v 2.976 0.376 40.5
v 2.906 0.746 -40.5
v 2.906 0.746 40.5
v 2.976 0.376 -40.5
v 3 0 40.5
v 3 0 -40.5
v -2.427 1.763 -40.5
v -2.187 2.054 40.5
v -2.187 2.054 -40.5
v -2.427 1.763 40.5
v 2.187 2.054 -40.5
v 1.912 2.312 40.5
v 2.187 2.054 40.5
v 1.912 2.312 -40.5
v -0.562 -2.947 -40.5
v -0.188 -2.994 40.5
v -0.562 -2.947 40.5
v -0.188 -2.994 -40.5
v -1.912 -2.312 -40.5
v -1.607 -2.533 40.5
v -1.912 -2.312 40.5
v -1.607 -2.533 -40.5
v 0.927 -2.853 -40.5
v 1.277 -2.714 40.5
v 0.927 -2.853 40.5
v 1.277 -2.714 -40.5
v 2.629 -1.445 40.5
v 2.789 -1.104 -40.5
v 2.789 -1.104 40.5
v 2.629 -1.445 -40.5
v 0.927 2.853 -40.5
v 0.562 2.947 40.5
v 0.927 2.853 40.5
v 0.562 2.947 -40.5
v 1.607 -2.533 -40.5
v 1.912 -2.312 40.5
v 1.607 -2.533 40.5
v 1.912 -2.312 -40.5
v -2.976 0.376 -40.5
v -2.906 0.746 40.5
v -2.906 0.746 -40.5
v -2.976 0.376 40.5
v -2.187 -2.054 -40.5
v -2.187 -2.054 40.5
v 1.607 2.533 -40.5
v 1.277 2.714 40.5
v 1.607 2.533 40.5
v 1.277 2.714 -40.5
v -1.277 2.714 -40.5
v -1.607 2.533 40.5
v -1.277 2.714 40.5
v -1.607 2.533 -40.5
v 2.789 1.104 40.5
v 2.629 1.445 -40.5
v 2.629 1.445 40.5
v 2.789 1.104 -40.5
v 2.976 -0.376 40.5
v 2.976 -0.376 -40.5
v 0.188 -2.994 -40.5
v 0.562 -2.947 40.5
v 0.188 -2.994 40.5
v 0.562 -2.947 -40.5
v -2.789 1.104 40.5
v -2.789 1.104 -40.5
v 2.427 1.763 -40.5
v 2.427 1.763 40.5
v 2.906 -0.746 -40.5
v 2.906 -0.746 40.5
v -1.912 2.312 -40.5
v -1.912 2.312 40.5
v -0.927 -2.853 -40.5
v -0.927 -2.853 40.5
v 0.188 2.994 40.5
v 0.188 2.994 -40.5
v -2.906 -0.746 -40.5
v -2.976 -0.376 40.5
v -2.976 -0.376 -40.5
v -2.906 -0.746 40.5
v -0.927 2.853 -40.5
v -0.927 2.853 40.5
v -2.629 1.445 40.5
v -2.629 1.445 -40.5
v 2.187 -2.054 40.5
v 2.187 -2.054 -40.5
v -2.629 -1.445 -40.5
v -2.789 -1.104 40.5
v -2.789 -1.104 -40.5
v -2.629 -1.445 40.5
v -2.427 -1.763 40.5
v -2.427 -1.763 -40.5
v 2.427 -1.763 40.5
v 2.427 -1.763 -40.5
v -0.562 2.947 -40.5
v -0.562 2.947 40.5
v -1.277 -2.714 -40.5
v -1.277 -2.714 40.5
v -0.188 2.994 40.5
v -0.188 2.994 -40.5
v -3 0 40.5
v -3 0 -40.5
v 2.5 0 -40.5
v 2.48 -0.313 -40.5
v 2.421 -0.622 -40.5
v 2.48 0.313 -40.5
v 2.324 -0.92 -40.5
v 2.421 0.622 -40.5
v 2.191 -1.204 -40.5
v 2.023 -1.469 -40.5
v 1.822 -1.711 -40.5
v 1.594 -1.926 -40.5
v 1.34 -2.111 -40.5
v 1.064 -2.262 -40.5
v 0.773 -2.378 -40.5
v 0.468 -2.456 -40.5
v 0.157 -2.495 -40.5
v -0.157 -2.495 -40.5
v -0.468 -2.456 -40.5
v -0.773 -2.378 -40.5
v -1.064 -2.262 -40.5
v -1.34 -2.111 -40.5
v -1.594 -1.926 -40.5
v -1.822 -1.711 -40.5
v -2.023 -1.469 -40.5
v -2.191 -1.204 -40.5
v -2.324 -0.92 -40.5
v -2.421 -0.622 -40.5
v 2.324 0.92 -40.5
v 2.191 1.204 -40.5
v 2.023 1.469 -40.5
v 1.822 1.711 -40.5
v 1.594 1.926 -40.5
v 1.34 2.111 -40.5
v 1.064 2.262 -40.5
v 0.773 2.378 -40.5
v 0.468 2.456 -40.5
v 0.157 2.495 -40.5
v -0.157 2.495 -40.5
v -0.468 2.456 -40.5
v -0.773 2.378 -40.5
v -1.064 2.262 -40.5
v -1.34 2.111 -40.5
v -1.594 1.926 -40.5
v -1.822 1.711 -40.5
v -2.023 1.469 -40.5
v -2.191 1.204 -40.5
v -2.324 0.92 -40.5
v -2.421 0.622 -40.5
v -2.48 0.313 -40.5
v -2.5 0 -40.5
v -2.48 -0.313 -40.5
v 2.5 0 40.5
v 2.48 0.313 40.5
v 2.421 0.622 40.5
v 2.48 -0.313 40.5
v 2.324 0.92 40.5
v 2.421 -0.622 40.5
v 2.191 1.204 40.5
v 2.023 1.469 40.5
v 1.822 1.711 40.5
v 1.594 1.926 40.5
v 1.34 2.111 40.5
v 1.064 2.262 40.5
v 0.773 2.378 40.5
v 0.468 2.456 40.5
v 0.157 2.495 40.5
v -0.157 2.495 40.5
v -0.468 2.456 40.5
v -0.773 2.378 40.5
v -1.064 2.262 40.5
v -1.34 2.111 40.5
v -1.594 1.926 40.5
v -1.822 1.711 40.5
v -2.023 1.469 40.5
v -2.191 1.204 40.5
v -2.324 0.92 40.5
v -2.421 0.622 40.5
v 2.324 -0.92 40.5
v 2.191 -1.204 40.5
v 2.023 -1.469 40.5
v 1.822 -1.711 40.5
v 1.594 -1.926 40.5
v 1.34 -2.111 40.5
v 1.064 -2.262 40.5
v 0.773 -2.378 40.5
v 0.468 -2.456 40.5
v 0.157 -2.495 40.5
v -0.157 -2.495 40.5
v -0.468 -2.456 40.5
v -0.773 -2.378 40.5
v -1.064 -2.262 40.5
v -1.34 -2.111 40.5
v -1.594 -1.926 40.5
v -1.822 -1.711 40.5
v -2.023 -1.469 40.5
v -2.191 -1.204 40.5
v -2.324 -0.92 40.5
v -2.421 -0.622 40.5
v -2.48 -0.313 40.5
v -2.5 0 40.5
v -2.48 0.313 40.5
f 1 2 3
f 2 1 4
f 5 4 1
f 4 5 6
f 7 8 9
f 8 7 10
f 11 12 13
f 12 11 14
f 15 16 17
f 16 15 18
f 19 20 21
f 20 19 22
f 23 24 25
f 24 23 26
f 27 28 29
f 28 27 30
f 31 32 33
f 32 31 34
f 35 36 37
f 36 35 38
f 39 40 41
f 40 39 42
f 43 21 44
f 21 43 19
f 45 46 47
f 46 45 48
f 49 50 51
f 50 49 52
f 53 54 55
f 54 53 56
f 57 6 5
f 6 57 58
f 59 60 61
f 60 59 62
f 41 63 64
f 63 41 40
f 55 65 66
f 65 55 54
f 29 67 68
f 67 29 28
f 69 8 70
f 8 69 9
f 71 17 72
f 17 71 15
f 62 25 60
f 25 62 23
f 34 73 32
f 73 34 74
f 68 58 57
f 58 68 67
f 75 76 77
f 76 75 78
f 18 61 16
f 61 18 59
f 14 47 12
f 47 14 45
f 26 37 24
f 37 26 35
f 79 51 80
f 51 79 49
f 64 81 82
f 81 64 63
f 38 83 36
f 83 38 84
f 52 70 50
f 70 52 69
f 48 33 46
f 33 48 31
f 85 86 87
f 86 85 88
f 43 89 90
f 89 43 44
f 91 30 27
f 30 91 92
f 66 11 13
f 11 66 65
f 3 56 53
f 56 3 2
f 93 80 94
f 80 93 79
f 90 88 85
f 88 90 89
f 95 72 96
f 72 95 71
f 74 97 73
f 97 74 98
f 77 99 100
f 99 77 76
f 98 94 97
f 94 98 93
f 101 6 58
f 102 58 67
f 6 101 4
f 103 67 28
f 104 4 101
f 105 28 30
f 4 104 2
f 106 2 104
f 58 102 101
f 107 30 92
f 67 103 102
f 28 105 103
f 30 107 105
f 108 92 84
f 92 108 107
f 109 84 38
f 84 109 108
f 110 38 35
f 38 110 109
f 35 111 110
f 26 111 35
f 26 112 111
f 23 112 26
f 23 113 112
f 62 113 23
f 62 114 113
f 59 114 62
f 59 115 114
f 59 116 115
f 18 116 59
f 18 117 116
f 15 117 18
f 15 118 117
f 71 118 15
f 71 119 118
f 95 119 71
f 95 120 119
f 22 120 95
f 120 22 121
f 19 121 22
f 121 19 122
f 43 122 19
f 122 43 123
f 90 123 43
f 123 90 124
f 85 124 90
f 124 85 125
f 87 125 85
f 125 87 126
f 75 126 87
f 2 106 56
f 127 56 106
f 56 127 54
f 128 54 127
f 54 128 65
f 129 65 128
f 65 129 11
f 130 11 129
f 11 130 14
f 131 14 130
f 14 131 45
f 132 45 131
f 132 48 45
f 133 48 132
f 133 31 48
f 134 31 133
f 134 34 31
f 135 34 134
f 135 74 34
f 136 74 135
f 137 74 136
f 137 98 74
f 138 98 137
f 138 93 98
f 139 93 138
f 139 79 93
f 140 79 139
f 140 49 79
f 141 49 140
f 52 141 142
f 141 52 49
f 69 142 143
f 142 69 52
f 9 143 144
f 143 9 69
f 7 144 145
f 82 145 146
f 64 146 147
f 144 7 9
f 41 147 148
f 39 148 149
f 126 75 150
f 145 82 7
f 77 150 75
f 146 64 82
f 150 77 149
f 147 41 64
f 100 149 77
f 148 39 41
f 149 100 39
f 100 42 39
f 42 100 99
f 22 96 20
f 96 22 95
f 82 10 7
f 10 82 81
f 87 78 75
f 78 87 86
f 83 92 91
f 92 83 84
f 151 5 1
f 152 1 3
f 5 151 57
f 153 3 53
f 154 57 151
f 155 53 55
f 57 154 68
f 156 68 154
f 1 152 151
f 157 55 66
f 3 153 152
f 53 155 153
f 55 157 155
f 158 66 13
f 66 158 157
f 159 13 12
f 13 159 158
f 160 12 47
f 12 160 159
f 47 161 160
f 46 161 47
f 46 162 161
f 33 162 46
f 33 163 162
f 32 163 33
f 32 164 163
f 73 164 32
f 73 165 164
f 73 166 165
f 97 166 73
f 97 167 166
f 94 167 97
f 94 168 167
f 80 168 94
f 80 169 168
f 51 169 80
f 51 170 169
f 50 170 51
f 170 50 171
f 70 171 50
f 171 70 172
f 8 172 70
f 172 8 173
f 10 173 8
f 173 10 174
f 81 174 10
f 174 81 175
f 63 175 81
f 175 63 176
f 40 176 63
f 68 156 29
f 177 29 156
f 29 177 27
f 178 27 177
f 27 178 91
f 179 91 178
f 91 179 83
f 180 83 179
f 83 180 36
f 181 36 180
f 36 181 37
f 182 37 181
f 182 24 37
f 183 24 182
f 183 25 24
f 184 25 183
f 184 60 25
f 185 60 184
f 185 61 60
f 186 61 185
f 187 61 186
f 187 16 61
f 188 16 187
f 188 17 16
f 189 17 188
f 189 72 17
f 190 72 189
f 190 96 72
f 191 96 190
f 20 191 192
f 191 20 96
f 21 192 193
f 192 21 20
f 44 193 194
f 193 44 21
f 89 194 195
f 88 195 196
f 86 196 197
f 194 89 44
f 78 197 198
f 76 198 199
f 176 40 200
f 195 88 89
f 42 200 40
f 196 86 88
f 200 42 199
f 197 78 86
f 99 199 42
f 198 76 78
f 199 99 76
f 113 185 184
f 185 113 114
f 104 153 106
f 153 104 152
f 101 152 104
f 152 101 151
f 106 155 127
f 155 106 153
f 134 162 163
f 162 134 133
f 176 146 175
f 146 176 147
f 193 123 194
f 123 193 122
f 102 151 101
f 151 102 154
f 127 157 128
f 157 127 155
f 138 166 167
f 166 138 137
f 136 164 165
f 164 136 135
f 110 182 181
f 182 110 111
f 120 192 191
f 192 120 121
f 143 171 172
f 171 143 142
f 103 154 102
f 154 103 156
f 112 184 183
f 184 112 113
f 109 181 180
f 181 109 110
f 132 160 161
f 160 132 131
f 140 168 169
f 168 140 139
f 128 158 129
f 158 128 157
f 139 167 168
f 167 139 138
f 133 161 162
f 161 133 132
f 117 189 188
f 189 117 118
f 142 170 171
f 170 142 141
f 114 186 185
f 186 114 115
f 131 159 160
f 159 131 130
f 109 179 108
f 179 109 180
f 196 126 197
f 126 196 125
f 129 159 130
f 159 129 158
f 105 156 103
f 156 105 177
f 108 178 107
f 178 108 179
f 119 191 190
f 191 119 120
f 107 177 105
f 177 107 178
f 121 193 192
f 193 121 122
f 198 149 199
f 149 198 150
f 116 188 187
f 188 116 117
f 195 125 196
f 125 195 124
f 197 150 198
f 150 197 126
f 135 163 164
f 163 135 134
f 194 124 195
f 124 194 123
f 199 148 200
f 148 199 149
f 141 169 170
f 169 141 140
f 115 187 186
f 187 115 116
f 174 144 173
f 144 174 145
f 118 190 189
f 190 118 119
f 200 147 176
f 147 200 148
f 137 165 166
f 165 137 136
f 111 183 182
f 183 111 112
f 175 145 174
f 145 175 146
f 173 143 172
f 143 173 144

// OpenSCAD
$fn = 50;


difference() {
	union() {
		translate(v = [0, 0, -40.5000000000]) {
			cylinder(h = 81, r = 3.0000000000);
		}
	}
	union() {
		translate(v = [0, 0, -100.0000000000]) {
			cylinder(h = 200, r = 2.5000000000);
		}
	}
}
